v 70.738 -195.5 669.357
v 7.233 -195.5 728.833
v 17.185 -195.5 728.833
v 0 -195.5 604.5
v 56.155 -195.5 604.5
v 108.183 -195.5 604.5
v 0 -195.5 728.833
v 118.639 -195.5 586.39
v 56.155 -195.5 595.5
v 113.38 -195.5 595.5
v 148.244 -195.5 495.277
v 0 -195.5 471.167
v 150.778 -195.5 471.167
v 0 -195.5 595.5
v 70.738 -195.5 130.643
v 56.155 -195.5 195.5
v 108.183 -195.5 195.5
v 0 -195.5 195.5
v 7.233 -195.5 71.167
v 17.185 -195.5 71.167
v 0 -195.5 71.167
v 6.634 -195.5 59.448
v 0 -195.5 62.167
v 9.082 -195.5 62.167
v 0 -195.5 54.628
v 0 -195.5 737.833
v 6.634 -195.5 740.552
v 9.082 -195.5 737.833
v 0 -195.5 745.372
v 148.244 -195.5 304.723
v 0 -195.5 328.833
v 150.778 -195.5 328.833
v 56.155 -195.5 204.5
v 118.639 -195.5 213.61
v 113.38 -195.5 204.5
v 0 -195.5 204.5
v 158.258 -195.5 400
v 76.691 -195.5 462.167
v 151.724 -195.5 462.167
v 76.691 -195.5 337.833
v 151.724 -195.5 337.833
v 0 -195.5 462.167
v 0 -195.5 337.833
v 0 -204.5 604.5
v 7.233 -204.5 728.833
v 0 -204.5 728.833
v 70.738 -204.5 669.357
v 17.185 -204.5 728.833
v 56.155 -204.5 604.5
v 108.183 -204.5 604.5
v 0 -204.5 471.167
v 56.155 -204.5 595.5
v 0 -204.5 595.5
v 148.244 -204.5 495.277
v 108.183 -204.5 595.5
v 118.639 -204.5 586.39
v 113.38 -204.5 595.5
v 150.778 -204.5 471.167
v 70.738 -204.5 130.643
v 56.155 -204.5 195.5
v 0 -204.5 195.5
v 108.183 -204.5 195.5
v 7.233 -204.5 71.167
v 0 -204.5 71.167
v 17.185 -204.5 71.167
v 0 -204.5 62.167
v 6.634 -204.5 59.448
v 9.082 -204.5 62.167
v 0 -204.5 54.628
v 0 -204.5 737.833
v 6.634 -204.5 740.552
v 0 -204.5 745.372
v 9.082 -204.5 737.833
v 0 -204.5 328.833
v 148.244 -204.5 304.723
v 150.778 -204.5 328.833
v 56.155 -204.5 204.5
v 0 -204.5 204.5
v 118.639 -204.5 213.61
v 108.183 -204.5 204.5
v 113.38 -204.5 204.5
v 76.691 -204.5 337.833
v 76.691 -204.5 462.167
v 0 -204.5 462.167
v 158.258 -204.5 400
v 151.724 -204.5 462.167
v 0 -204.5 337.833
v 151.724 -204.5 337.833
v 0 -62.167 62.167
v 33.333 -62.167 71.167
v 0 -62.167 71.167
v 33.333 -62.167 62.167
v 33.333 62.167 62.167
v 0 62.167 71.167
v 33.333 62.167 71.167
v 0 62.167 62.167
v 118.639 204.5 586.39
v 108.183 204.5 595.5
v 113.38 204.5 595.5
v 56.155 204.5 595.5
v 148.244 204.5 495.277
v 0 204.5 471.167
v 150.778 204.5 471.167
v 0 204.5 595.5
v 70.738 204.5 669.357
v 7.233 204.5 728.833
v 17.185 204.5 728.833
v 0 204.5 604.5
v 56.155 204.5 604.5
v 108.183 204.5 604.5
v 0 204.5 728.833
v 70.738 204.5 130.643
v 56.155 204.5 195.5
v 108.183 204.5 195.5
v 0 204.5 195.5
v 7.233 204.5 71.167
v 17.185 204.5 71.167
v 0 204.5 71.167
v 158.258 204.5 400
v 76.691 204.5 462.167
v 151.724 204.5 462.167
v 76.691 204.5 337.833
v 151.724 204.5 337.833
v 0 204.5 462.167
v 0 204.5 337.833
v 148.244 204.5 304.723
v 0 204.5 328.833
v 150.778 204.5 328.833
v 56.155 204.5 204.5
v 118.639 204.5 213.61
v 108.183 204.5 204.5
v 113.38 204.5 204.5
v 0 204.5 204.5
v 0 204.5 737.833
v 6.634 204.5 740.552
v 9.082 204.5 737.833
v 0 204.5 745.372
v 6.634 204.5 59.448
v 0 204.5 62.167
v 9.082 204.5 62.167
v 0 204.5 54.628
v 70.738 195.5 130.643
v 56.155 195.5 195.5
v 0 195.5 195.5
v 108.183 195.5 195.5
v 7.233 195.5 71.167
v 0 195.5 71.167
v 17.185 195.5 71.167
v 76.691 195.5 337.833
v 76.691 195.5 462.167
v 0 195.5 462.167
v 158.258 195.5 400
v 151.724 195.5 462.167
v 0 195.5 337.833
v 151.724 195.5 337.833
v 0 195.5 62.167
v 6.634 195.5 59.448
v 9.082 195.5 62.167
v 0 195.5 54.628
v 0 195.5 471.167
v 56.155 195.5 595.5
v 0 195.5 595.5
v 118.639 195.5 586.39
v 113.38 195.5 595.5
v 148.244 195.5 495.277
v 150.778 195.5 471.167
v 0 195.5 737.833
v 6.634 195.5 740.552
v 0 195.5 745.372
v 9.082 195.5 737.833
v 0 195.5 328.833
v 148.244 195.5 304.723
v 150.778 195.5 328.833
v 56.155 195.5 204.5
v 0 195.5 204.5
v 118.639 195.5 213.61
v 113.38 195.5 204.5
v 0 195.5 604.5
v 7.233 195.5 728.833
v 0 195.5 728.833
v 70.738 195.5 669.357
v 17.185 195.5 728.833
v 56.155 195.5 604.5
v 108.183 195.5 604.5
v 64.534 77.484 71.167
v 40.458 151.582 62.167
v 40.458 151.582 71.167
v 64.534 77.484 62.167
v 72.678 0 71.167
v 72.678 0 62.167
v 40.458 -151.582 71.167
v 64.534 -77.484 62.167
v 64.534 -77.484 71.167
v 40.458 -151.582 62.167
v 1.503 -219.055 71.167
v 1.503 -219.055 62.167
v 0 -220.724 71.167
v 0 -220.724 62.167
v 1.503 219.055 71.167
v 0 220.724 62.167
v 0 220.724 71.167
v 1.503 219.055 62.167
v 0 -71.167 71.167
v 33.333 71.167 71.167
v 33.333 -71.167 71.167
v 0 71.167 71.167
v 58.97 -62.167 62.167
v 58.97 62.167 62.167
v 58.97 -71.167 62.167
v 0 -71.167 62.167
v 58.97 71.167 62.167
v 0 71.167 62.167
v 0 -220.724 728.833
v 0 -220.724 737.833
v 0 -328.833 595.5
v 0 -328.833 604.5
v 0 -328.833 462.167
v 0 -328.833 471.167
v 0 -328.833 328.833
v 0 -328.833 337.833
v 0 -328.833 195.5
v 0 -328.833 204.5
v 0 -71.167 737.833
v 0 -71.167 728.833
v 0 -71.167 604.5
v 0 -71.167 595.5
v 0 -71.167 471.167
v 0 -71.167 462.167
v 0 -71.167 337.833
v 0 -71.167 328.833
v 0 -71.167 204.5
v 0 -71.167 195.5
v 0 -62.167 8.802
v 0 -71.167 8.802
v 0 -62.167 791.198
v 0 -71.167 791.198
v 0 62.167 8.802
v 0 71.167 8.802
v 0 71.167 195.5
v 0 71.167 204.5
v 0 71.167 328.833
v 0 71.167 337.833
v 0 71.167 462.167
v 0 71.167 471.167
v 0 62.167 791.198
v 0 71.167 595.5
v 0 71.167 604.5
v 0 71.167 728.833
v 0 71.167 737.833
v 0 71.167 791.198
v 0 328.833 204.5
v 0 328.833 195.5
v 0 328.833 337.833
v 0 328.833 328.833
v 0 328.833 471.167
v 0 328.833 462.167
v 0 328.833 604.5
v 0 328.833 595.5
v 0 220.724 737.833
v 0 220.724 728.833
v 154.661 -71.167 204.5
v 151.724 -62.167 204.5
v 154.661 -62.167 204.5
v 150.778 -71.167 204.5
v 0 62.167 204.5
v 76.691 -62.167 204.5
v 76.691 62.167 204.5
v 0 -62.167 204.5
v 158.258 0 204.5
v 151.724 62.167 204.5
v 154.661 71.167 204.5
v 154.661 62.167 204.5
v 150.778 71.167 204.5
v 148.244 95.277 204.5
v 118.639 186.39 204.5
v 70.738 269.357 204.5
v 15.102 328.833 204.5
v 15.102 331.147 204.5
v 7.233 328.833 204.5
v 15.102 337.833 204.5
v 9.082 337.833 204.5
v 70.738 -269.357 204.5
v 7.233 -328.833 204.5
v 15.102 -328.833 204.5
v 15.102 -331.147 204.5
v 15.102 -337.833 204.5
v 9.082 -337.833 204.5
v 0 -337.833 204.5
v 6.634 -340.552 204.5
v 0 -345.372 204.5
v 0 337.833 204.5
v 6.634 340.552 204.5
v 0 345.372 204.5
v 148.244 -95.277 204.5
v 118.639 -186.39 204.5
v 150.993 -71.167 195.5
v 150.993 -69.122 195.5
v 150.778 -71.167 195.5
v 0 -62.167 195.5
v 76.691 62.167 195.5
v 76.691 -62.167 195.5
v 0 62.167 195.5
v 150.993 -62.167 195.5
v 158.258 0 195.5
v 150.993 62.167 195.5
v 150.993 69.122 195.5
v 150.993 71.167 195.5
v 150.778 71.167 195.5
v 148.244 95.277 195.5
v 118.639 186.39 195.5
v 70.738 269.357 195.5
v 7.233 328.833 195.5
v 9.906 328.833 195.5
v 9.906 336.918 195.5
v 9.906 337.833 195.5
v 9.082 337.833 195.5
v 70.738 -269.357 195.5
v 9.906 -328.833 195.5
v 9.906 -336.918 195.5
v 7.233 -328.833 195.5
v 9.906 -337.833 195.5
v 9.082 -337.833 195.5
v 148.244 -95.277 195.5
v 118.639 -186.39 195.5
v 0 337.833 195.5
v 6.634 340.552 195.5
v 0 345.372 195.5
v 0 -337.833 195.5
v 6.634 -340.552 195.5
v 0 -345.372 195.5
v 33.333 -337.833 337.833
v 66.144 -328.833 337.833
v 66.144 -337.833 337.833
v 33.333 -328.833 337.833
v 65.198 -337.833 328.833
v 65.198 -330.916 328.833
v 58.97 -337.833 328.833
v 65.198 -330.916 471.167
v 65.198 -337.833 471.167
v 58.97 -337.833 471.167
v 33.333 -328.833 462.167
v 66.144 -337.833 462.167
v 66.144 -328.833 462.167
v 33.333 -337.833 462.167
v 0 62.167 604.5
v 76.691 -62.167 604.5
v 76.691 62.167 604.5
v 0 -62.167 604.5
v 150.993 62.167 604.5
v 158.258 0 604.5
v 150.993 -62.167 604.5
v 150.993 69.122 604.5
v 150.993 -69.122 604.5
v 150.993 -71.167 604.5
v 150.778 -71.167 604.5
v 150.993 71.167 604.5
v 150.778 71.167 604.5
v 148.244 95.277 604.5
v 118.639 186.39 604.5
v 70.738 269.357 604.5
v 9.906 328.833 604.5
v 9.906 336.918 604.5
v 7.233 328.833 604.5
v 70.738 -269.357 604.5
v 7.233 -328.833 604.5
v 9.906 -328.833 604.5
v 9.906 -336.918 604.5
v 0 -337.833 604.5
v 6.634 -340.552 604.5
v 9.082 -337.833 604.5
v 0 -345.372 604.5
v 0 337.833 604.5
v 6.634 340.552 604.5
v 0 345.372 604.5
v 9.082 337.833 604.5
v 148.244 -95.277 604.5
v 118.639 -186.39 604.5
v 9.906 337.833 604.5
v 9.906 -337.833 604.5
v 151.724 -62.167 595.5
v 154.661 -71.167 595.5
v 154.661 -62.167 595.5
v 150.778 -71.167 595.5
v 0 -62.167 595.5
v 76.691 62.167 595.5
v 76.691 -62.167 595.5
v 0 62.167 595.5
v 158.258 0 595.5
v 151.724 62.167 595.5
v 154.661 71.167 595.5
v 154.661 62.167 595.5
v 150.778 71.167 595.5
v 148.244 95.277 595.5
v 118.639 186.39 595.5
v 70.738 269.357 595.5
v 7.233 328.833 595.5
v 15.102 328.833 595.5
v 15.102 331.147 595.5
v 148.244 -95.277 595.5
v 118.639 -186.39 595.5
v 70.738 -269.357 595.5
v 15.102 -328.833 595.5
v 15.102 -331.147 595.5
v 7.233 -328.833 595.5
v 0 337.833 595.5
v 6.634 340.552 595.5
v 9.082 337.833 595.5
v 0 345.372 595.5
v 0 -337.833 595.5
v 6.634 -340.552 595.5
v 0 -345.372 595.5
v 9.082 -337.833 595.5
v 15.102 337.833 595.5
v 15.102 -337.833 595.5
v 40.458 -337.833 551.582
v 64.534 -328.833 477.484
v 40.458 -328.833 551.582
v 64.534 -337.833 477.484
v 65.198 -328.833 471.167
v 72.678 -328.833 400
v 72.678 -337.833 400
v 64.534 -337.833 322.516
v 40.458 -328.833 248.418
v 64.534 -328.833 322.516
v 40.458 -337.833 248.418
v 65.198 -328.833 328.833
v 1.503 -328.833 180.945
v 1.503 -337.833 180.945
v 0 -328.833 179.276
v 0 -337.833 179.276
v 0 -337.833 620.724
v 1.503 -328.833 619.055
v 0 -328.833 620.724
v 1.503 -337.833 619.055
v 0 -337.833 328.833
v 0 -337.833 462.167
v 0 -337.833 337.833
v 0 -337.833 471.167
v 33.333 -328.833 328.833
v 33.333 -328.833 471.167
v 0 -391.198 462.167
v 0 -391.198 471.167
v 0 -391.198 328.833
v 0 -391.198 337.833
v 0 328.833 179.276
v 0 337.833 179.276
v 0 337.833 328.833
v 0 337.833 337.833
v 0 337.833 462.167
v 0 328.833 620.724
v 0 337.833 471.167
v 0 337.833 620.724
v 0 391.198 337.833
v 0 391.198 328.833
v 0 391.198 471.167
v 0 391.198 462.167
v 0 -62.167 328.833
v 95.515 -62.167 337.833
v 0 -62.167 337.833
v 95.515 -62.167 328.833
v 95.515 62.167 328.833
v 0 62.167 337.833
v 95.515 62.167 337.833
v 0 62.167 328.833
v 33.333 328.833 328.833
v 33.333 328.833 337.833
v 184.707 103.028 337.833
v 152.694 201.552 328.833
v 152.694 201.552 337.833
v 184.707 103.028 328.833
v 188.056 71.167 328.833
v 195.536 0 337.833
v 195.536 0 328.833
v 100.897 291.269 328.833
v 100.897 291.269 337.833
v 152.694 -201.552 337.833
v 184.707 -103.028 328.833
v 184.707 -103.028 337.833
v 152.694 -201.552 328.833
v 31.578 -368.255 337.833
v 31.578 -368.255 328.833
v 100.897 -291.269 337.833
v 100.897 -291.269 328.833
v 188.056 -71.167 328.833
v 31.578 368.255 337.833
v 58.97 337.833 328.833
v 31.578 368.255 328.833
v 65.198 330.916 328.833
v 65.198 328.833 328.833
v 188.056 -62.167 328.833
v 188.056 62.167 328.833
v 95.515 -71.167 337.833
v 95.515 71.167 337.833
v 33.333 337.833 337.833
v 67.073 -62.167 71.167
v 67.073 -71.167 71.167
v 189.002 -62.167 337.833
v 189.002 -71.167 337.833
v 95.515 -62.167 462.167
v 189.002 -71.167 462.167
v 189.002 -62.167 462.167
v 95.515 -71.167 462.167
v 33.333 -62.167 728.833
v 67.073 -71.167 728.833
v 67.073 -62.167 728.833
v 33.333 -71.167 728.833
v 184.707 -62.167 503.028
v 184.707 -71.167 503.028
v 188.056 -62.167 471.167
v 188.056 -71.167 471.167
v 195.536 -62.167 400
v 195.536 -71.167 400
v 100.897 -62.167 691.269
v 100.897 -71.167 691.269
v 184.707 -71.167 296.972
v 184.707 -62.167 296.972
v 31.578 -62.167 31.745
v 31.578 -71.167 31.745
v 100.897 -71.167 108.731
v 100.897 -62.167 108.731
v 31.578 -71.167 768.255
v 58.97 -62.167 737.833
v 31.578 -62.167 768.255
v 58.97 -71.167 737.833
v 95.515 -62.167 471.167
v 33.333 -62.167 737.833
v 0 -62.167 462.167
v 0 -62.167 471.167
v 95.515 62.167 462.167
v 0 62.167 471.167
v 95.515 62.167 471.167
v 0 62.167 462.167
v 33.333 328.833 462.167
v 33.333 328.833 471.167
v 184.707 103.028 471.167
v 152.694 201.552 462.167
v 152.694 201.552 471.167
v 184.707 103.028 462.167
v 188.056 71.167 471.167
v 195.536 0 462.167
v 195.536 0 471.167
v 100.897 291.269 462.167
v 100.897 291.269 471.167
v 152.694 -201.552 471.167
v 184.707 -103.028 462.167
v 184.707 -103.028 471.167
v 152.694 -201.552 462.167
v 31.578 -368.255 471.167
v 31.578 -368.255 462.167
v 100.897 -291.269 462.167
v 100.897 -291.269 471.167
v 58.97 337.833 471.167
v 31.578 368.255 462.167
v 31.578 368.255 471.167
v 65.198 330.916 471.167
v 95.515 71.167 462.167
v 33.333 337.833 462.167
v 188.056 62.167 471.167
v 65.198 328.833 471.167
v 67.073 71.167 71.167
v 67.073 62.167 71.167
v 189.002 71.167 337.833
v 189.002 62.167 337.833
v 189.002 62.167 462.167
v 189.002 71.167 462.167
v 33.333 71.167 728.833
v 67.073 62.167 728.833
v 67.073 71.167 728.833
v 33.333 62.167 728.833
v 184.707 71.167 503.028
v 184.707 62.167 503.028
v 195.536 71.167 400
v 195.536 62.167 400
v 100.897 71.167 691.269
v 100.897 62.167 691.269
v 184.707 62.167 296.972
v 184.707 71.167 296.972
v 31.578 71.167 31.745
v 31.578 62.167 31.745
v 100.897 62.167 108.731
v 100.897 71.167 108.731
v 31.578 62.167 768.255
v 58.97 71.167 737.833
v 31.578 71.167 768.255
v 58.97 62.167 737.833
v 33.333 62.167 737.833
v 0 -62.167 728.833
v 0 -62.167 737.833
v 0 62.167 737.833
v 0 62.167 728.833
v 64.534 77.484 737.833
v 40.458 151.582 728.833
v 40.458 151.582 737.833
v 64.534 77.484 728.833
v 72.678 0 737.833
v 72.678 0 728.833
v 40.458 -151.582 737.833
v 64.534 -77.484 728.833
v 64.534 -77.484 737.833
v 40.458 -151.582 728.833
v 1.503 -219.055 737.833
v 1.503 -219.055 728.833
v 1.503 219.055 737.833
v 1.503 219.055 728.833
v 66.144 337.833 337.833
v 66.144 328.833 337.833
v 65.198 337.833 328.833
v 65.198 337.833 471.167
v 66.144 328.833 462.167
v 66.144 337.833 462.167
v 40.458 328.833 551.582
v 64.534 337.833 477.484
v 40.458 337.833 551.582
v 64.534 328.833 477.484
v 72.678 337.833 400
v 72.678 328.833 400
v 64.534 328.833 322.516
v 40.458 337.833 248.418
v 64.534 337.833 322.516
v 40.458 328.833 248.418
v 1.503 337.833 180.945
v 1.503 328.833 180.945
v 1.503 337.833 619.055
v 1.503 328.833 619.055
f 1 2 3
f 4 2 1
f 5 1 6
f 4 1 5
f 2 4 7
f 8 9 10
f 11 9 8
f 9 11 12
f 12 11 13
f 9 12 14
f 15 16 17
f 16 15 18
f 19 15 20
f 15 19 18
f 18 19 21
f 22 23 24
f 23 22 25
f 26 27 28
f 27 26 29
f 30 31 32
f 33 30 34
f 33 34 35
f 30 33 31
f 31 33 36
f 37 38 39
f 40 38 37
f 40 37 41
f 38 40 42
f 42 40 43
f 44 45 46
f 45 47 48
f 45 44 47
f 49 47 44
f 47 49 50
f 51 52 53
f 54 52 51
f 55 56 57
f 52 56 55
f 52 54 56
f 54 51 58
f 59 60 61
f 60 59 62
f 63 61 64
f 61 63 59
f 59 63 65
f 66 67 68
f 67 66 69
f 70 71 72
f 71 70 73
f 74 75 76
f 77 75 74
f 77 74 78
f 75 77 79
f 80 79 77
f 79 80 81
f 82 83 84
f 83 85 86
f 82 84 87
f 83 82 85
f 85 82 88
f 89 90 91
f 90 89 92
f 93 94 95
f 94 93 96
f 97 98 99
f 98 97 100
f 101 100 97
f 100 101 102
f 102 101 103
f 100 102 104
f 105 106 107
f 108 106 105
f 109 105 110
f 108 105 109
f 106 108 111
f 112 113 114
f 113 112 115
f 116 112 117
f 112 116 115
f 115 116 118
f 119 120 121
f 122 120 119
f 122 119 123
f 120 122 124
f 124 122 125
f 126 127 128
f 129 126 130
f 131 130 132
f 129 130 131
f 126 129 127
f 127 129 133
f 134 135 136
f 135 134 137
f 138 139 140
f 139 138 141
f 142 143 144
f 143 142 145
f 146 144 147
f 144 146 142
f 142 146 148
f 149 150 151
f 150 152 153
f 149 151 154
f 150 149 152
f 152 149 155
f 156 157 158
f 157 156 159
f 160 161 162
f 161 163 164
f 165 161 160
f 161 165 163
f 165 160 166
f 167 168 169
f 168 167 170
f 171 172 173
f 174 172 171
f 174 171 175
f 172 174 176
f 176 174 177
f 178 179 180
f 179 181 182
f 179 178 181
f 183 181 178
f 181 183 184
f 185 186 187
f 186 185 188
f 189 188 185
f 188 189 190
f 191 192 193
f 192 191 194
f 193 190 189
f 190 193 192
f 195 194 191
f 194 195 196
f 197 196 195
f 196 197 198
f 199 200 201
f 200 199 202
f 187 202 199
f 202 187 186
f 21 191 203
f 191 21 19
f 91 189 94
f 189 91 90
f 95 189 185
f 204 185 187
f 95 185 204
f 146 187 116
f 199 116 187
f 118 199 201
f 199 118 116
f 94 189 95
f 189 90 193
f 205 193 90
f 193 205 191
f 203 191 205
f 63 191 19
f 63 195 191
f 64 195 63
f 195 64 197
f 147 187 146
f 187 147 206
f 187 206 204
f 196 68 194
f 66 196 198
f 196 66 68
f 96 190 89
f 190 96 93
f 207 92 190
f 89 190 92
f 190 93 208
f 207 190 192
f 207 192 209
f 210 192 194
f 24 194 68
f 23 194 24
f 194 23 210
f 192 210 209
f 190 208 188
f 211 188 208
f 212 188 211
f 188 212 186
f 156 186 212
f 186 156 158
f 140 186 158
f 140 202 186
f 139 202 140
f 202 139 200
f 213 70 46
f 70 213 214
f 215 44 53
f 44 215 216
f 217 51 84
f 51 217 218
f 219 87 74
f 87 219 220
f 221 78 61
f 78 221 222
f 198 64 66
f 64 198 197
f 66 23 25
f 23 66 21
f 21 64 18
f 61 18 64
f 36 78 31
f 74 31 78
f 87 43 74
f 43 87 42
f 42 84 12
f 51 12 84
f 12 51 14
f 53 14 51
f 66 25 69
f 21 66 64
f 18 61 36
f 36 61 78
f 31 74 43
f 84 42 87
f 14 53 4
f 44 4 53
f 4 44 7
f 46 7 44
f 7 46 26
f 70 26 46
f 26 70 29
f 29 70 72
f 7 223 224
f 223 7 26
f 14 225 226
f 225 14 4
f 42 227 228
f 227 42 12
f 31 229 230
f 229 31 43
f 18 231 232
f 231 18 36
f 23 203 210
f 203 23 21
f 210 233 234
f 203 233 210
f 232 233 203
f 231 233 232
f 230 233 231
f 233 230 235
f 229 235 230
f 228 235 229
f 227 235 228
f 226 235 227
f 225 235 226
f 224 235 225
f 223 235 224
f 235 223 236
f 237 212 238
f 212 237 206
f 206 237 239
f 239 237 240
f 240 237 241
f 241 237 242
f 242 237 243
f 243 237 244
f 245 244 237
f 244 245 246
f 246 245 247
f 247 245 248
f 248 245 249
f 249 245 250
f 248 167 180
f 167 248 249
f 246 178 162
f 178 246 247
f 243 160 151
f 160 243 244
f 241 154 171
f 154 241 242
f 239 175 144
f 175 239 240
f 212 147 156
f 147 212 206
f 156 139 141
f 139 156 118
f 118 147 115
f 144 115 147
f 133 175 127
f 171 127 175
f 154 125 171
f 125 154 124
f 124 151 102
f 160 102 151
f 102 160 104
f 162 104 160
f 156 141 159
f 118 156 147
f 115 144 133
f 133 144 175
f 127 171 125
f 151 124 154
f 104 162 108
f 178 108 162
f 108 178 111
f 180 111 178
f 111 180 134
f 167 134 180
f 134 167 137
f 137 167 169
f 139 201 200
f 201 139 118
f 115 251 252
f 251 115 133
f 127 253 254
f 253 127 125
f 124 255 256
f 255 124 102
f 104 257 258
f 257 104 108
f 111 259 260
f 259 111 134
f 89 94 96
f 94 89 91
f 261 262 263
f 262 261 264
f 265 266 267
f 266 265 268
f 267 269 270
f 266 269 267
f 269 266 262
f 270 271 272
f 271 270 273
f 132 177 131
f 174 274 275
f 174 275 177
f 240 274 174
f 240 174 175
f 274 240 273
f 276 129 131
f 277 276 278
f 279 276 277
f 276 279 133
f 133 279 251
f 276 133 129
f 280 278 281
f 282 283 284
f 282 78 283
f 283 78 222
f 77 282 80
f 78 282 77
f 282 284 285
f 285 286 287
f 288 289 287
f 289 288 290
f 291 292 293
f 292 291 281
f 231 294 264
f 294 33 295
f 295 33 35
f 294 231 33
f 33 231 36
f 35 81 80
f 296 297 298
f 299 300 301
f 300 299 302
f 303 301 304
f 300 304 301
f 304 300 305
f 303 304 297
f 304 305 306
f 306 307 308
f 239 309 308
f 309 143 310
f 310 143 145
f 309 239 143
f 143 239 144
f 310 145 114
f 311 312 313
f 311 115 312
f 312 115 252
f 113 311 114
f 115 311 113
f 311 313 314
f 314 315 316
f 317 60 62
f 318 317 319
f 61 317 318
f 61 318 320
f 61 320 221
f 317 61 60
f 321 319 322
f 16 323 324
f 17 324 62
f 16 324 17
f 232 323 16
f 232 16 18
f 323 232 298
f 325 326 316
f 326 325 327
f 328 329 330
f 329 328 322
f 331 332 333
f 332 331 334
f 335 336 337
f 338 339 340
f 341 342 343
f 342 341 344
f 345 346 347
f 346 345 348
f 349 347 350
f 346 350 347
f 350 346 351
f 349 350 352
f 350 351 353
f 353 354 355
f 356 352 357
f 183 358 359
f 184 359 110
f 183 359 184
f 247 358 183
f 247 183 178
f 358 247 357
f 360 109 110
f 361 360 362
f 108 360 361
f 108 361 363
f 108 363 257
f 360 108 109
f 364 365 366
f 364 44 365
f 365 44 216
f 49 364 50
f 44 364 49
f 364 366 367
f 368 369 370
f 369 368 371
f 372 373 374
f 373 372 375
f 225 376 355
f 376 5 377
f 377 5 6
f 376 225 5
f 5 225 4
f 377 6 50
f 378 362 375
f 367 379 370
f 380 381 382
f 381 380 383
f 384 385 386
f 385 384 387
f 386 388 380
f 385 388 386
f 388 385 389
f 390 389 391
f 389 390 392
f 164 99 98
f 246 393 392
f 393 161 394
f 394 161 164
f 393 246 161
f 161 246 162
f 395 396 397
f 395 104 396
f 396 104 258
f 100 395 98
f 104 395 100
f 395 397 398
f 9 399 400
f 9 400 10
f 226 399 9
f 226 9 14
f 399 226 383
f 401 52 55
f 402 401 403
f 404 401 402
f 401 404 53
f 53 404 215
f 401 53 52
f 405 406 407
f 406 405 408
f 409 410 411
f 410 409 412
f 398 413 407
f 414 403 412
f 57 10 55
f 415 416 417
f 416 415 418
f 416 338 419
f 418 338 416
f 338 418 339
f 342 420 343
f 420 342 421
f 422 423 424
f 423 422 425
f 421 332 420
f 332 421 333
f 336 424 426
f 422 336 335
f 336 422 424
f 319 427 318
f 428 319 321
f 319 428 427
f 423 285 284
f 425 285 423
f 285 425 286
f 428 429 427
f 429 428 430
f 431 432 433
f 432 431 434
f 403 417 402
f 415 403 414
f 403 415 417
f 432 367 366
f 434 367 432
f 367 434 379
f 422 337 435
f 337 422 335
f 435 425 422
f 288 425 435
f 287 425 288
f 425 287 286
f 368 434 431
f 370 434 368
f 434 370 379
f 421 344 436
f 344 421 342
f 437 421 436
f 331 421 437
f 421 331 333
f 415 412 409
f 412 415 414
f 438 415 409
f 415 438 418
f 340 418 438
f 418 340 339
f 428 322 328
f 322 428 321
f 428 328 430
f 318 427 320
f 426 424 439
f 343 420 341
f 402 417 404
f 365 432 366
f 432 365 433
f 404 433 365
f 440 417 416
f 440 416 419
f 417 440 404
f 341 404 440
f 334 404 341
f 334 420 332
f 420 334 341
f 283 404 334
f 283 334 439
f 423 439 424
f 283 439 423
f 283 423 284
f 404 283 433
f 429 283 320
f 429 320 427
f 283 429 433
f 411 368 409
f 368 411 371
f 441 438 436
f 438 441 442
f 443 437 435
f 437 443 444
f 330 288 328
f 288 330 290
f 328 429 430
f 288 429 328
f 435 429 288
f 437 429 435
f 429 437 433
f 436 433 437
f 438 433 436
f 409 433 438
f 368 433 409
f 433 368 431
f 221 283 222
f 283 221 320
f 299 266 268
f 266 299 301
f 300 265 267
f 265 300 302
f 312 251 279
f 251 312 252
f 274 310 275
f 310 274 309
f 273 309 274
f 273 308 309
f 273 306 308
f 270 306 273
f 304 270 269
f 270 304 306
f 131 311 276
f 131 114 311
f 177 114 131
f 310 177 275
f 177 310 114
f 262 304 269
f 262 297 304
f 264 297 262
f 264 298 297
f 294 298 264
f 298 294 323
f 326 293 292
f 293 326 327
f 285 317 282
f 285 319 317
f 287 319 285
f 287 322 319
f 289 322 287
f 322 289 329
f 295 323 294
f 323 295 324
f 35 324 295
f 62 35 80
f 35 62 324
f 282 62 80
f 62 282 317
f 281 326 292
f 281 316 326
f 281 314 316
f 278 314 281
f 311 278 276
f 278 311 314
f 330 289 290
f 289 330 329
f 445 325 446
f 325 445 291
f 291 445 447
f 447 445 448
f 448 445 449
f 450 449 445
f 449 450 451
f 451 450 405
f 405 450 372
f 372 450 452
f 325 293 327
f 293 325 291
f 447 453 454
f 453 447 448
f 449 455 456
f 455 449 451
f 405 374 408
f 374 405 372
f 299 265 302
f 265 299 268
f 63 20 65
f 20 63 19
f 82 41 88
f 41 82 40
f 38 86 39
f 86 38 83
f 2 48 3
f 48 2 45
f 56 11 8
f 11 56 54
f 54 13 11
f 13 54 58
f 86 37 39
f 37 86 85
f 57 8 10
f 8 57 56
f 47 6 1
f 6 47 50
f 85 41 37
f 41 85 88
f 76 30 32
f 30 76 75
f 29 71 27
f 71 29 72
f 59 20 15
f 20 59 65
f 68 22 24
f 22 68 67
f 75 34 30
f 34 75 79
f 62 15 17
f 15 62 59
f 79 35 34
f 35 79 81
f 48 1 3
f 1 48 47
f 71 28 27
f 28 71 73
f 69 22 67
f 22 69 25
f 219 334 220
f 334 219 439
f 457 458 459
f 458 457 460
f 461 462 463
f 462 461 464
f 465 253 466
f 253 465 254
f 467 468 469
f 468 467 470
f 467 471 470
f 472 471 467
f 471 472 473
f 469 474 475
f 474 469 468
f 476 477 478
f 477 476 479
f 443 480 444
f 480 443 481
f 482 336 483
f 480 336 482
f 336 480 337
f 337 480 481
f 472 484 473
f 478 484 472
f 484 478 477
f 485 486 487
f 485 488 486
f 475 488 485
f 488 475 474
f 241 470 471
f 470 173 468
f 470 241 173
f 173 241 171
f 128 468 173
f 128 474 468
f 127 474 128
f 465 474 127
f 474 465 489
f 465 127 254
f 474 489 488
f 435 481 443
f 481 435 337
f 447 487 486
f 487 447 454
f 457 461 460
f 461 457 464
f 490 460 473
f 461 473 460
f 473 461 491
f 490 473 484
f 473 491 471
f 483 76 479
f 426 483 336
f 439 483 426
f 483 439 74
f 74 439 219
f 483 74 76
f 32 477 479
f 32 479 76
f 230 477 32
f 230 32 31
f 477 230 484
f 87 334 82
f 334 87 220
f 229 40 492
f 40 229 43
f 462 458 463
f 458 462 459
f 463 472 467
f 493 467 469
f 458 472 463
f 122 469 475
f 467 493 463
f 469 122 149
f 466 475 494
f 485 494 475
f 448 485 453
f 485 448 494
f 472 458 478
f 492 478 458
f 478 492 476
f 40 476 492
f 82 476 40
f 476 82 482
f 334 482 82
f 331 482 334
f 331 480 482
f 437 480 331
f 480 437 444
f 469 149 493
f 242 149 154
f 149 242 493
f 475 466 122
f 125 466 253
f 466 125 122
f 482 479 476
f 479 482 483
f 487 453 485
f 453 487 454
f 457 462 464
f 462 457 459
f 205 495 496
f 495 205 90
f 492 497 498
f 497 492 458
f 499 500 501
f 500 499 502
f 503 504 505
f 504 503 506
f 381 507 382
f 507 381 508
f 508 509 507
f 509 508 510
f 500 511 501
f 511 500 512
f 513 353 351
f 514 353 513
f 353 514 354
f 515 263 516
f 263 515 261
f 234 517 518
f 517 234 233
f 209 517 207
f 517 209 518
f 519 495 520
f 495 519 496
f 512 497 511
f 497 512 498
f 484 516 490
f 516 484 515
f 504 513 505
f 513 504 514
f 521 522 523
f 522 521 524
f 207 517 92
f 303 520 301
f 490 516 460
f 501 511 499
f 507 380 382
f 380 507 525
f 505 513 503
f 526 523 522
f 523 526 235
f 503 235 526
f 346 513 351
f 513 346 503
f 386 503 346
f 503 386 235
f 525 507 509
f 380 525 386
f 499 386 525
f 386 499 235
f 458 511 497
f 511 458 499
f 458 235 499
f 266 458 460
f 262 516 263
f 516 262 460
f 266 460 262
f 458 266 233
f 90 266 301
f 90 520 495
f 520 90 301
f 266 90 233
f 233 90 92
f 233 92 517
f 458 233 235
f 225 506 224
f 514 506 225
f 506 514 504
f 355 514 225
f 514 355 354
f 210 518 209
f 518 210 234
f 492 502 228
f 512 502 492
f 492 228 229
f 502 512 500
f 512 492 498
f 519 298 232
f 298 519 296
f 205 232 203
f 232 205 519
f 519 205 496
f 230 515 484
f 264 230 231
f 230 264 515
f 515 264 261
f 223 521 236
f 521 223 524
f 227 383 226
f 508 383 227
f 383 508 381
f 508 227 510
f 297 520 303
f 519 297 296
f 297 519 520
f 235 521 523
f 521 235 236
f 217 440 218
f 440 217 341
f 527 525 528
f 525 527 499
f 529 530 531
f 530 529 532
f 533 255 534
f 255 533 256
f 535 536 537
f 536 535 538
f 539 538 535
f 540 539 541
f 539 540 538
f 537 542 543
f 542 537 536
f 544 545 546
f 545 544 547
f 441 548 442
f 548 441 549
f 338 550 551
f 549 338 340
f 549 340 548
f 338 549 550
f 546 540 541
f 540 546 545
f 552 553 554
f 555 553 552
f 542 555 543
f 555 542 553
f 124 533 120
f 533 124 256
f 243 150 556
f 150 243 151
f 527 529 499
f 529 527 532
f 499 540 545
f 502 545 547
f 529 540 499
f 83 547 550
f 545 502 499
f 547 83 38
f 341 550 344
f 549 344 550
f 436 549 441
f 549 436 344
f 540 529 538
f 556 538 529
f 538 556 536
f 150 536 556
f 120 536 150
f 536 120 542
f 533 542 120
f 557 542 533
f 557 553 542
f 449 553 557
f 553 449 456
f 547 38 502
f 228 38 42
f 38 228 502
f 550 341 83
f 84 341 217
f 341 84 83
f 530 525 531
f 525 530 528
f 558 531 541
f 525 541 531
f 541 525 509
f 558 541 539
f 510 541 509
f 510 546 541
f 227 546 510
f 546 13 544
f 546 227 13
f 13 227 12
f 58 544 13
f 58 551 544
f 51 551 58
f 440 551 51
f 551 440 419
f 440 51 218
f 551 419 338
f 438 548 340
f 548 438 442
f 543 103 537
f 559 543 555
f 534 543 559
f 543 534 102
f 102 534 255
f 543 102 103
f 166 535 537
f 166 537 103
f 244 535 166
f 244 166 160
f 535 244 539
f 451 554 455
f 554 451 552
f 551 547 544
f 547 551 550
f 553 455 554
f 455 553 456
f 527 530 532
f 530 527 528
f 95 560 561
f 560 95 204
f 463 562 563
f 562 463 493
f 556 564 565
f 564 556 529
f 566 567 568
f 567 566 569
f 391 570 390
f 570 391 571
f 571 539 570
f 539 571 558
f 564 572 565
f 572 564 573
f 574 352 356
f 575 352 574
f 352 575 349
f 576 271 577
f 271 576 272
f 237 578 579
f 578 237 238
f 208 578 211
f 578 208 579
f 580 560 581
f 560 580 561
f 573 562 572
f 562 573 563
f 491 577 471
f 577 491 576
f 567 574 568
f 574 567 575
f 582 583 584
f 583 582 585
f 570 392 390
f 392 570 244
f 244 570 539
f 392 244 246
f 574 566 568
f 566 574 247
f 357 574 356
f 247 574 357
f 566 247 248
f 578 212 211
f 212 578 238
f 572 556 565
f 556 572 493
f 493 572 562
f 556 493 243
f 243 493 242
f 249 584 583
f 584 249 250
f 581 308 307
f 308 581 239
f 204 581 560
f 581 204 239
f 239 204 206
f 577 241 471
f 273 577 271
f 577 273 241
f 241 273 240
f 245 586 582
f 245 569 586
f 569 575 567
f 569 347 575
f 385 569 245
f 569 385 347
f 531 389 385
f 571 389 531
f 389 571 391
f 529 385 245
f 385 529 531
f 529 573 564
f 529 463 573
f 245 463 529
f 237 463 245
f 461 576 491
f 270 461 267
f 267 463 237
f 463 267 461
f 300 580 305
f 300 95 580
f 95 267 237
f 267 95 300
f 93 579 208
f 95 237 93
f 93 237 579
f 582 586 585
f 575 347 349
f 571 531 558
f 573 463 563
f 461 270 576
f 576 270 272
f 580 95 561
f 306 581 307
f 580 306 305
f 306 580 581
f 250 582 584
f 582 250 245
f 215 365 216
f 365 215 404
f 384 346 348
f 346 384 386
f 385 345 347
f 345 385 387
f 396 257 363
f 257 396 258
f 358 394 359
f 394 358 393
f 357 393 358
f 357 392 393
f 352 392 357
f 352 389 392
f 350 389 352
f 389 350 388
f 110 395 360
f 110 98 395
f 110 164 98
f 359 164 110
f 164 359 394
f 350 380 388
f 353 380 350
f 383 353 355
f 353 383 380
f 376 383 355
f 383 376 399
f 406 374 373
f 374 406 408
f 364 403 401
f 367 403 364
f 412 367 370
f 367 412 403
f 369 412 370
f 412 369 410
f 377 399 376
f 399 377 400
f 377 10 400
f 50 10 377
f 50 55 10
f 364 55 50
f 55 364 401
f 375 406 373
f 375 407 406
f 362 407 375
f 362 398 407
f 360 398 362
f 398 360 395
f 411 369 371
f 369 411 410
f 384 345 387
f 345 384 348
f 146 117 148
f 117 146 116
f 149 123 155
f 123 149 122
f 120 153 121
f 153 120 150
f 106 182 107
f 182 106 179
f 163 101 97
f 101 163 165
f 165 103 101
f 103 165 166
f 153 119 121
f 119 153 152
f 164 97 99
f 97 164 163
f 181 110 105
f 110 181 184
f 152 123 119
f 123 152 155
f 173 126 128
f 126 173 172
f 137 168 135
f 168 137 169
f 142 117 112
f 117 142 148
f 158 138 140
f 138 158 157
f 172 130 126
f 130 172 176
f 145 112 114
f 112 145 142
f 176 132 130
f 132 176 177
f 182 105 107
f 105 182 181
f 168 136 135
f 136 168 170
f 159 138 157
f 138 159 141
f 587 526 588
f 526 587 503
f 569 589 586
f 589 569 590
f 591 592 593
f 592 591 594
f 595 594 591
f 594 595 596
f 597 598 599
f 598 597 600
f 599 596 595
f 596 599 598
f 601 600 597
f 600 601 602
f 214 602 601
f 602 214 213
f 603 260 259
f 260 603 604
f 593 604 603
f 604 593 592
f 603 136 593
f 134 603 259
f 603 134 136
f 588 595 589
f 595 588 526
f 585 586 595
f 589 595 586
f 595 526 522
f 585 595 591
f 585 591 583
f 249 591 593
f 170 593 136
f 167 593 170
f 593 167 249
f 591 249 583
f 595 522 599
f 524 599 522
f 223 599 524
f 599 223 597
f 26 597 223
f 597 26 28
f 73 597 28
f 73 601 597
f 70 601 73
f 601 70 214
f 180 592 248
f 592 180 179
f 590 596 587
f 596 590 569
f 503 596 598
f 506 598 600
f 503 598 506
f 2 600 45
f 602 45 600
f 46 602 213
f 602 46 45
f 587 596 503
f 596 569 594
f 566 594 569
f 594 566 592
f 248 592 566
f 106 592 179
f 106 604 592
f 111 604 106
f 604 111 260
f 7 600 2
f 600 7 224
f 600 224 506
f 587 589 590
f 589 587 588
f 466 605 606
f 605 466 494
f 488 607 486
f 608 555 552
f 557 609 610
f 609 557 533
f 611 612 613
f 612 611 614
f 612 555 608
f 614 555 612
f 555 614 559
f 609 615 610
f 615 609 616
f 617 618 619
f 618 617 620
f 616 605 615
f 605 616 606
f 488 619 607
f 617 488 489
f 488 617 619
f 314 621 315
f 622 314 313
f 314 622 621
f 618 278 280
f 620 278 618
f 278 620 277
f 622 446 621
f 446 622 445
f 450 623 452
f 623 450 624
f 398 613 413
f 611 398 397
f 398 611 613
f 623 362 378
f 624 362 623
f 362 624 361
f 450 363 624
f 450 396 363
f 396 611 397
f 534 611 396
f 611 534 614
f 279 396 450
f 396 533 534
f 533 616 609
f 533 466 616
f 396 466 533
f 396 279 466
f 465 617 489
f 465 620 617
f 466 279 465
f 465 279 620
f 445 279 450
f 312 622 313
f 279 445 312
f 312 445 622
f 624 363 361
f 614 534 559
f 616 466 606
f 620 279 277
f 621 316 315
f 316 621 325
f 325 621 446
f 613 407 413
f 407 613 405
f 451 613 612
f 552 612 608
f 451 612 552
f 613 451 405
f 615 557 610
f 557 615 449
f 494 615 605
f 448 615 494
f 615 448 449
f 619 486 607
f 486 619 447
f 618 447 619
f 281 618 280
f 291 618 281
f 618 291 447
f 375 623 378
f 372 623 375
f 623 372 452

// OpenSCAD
// parametric bookshelf
// by Jaap
//
//radius of the visible part of the sphere
wall_radius = 400;//[10:2000] 
// thickness of the material
mat_thickness = 9.0;//[2:30]
// how far it sticks out of the wall
shelve_depth = 200;//[1:1000]		
// number of shelves
shelves = 6;//[1:30]		
// cut loss (for laser cutting)
cut_loss = 0.0;
// overcut radius for cnc milling (1/2 mill thickness)
overcut = 0;//[0:15]
// 3D view or DXF output
3dview = 1;//[0:1]

// calculations
sd = shelve_depth;
rv = wall_radius;		// visible radius on wall
r = (pow(rv,2)+pow(sd,2)) / (2 * sd); // sphere radius
h = mat_thickness-cut_loss;	// material heigth in drawing

// openscad precision settings
$fn=30 *1;

// definitions
HORIZ = true;
VERT = false;

module outline() { // debug: draw a sphere
	translate([0,0,rv]) {
		difference() {
			translate([-r+sd,0,0]) sphere(r);
			translate([-2-r*2,-r-1,-r-1]) cube([2+r*2,2+r*2,2+r*2]);
		}
	}
}

module slice(z,step,out) {
rh = sqrt(pow(r,2)-pow(rv-z,2));	// radius slice on current height
cd = r-sd; // center distance: distance radius to x=0
translate([-cd,0,0]) difference() { 
	cylinder(h, rh, rh, true);
	translate([-2*rh+cd,-rh,-1-h/2]) cube([rh*2,rh*2,h+2]);
	for (s=[step/2:step:rv*2]) {
		xoffs = (sqrt(pow(rh,2)-pow(s-rv,2))-cd)/2; // half depth
		xv = out ? cd-1 : cd+xoffs-overcut; // inner or outer?
		xt = out ? xoffs + 1 + overcut : xoffs * 2 + overcut;
		translate([xv,-rv+s-h/2,-1-h/2]) cube([xt,h,h+2]);
	}
  }
}

module sphereit() { // show in 3D
	step = (rv*2)/shelves;
	for(z=[step/2:step:rv*2]) {
		translate([0,0,z]) slice(z,step,HORIZ);
		translate([0,z-rv,rv]) rotate([90,0,0]) slice(z,step,VERT);
	}
}
module flatout() { // show in flat plate for cutting (DXF)
	projection(cut=true) {
		step = (rv*2)/shelves;
		for(z=[step/2:step:rv*2]) {
			translate([z*3,0,0]) slice(z,step,HORIZ);
			translate([z*3,rv*2,0]) slice(z,step,VERT);
		}
	}
}
//outline();
if (3dview) sphereit();
else flatout();
//flatout();
